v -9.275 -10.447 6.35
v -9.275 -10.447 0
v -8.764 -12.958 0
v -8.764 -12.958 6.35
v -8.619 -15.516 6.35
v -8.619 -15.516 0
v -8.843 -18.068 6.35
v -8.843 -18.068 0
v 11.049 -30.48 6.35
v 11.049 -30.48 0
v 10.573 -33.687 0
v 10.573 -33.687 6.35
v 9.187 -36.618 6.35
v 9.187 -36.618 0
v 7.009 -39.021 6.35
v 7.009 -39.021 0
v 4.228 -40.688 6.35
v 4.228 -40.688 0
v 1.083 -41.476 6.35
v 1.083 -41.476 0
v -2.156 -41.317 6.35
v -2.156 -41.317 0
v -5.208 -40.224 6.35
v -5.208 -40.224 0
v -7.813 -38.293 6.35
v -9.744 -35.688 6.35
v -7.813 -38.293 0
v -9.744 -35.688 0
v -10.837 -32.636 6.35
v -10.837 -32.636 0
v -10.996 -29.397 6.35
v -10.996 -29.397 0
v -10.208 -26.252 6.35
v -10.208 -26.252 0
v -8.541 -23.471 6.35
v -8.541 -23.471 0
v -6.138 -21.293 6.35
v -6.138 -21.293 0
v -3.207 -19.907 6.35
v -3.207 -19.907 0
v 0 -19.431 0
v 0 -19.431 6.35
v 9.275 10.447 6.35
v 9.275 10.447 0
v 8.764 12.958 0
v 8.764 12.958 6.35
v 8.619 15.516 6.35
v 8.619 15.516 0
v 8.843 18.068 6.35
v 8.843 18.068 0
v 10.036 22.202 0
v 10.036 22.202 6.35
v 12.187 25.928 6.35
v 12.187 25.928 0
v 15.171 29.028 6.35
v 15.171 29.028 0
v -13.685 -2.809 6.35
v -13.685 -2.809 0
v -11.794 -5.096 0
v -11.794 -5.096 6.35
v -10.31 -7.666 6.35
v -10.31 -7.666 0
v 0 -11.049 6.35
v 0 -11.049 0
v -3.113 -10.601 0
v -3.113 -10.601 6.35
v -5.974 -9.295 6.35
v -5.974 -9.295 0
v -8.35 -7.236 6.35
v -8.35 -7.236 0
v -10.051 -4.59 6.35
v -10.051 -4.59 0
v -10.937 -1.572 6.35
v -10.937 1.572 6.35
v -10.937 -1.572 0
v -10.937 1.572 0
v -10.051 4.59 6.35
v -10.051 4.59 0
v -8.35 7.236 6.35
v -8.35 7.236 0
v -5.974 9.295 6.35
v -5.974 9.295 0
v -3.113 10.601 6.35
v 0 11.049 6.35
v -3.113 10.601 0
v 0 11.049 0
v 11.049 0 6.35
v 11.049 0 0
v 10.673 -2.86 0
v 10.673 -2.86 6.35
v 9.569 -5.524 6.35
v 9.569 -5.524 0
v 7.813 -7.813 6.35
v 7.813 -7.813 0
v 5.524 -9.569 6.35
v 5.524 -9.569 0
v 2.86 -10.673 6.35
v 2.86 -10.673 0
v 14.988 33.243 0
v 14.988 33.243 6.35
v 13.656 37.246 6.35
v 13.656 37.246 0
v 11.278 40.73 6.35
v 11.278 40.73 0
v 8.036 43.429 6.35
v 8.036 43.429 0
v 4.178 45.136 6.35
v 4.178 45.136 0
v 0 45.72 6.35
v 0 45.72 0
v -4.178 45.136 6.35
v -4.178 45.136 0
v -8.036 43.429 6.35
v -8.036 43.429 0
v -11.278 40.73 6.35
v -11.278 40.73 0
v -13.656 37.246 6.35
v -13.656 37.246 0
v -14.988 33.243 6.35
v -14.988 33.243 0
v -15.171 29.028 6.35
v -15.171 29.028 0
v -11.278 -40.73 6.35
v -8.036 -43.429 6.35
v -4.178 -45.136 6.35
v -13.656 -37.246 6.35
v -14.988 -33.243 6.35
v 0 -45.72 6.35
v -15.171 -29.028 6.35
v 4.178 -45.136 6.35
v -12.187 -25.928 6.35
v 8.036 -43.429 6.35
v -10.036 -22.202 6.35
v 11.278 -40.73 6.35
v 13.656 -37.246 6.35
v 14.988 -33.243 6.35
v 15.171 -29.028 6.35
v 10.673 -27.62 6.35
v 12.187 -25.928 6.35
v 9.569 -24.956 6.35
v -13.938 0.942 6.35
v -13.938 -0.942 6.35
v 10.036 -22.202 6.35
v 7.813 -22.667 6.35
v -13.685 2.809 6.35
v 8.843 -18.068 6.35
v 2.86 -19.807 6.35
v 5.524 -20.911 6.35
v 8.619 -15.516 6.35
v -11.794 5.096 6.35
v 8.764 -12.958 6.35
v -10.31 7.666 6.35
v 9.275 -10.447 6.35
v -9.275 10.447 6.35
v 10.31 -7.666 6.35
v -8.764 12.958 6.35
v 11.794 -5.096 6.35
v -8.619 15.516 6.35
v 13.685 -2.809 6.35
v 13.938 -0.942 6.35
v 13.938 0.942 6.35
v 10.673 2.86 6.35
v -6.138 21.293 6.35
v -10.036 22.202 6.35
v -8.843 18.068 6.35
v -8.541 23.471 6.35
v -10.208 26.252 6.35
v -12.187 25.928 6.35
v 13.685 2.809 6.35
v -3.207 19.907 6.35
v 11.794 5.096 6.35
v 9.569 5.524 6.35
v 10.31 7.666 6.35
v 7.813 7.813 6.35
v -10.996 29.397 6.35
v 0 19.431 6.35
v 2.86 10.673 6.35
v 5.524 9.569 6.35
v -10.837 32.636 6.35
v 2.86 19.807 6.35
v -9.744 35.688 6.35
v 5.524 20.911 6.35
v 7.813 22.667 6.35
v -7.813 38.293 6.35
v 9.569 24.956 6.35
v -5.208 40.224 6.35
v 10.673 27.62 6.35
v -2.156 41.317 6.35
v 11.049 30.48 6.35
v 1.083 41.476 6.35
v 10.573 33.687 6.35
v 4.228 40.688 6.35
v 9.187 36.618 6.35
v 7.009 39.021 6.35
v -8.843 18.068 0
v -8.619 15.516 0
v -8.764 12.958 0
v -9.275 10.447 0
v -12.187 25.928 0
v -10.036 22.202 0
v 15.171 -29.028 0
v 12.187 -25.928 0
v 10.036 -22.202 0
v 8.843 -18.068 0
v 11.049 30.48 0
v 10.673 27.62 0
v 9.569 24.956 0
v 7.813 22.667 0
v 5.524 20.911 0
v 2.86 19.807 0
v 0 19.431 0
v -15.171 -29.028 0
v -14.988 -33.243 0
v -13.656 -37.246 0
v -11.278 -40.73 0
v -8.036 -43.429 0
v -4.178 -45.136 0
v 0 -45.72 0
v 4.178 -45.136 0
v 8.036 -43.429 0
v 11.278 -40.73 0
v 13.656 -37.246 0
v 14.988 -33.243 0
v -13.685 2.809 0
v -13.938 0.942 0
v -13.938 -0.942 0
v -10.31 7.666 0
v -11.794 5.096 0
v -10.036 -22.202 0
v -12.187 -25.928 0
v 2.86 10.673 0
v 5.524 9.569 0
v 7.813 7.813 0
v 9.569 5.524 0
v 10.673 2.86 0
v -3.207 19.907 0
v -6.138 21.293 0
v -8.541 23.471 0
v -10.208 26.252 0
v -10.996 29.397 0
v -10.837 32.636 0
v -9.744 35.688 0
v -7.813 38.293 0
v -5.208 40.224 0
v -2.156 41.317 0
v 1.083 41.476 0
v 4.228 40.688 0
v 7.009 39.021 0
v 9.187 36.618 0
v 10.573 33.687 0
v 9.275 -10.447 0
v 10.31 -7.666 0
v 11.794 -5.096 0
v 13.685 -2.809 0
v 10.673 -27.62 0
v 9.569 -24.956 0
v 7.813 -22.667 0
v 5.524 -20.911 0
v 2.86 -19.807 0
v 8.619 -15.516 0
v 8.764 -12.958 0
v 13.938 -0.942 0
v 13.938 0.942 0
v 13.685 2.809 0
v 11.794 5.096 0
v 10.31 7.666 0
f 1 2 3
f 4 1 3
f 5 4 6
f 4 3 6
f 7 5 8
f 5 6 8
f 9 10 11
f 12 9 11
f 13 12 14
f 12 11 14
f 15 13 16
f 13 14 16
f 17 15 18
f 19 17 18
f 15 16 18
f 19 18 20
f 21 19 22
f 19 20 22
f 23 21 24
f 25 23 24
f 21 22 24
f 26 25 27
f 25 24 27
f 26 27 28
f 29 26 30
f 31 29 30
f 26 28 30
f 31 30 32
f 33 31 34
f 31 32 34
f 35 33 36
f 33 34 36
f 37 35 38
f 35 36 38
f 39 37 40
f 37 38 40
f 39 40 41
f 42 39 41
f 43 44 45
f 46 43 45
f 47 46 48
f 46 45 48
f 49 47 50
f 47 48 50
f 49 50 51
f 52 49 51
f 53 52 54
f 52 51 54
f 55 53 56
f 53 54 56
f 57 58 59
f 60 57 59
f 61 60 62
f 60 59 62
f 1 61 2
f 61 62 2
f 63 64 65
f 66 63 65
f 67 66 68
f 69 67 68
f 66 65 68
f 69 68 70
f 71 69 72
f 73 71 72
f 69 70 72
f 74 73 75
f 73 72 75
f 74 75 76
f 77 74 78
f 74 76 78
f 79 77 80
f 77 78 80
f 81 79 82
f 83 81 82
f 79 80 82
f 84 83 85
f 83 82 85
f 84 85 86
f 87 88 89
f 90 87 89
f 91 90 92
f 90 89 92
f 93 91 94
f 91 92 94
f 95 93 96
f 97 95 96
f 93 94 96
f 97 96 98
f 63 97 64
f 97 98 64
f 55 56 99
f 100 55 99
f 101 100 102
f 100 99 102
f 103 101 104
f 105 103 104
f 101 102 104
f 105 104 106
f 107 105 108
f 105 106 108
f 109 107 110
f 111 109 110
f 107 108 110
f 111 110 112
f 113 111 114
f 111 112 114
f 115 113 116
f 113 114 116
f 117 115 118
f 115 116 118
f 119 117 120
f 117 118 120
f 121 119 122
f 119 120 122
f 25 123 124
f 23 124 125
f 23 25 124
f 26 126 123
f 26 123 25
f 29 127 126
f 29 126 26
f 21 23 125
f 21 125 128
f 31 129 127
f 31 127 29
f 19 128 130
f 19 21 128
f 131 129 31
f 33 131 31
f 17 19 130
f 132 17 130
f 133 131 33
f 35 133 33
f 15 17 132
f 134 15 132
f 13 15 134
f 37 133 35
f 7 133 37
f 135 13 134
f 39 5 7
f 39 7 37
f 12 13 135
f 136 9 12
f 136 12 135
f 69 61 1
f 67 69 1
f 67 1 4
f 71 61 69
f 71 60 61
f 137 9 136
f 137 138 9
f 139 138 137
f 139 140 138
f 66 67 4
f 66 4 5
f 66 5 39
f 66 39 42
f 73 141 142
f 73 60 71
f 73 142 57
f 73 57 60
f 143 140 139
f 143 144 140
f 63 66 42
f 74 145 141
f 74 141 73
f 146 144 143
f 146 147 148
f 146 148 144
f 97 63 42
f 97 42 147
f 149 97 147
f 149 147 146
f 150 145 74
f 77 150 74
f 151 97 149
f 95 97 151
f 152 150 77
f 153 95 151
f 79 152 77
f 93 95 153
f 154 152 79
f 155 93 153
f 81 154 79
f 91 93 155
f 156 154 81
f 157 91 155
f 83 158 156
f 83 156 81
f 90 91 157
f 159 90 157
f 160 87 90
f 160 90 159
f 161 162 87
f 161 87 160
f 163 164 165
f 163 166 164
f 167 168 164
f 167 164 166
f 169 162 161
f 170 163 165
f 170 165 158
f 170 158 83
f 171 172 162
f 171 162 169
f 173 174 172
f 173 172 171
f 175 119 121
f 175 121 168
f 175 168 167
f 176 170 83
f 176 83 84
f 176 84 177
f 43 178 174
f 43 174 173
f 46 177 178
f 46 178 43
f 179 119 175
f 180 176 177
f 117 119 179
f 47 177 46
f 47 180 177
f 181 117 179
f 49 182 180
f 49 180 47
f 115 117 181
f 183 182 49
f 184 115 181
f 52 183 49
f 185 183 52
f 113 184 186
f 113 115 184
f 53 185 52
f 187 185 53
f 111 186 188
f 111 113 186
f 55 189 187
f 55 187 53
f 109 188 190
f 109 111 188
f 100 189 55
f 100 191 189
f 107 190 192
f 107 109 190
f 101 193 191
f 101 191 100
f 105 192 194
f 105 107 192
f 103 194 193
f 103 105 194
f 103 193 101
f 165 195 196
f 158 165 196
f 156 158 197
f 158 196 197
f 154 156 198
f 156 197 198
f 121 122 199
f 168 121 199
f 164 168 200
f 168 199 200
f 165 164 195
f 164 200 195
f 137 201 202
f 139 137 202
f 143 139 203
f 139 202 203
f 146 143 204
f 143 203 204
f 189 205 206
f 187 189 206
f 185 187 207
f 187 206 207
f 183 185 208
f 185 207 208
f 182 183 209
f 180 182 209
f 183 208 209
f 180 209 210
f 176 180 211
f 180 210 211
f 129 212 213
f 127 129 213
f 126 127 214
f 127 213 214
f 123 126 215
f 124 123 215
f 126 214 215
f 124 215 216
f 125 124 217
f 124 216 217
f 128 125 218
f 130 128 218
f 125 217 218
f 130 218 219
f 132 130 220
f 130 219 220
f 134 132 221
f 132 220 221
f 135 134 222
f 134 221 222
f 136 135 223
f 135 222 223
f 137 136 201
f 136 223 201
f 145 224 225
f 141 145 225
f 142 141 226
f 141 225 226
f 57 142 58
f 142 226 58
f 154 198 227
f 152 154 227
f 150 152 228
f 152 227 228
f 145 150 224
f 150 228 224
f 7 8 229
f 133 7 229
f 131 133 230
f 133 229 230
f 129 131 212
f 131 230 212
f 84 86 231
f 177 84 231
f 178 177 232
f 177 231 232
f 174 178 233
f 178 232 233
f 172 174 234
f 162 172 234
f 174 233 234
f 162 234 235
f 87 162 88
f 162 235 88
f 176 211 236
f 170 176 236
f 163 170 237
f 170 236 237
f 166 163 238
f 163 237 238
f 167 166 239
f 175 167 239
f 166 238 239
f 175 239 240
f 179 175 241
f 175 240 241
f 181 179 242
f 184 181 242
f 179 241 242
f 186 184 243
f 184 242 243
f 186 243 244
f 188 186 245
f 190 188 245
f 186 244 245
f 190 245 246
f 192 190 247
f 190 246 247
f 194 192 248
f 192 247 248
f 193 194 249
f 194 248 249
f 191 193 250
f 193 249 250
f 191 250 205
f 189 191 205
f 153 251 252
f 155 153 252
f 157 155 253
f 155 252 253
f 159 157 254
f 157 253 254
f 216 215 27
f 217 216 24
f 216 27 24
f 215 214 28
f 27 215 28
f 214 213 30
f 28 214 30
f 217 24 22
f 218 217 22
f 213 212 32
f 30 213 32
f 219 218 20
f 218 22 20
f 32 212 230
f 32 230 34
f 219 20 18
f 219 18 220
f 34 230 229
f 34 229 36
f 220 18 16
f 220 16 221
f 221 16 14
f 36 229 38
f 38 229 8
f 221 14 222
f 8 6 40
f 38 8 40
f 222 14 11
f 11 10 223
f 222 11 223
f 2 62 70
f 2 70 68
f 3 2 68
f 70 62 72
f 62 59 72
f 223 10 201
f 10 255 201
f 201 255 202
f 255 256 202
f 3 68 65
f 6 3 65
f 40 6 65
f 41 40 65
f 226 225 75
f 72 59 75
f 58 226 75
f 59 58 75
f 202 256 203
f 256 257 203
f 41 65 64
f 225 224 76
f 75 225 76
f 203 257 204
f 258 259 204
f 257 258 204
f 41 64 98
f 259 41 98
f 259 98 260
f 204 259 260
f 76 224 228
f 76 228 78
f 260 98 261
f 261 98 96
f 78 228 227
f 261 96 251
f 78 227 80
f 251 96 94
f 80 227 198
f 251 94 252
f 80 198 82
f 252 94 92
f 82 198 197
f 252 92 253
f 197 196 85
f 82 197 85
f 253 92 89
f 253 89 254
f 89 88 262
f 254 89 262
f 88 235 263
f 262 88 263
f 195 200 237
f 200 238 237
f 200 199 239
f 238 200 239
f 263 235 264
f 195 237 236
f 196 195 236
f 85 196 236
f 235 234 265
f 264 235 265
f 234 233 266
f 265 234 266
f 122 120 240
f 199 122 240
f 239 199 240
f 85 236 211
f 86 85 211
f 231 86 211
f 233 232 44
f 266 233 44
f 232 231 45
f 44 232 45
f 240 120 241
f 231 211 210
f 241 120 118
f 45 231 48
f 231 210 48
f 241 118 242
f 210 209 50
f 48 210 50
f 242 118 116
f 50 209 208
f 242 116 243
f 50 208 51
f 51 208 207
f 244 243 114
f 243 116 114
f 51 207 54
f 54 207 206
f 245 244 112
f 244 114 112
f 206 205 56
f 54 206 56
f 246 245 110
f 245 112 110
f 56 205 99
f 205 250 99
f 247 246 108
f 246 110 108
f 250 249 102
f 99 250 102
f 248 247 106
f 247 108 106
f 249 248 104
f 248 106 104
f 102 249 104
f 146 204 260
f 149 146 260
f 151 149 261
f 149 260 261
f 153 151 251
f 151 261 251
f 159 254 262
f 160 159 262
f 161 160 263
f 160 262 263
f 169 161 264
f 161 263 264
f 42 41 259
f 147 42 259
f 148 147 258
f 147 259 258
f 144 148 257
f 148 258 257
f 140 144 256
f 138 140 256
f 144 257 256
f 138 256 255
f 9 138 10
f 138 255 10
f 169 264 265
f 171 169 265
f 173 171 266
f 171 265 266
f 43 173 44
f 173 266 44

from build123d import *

# Parameters (mm, degrees)
F1_DEPTH = 6.35


with BuildPart() as f1:
    # F0 (on Top) → F1 (new body)
    with BuildSketch(Plane.XY):
        with BuildLine():
            ThreePointArc((-8.8427640474, 18.067783276), (-4.6419509437, 15.9641503371), (0, 15.24))
            ThreePointArc((0, 15.24), (4.6419509437, 15.9641503371), (8.8427640474, 18.067783276))
            ThreePointArc((8.8427640474, 18.067783276), (10.9985226281, 24.13), (15.1706770239, 29.0280500573))
            ThreePointArc((15.1706770239, 29.0280500573), (0, 45.72), (-15.1706770239, 29.0280500573))
            ThreePointArc((-15.1706770239, 29.0280500573), (-10.9985226281, 24.13), (-8.8427640474, 18.067783276))
        make_face()
        with BuildLine():
            ThreePointArc((11.049, 30.48), (7.8128228253, 22.6671771747), (0, 19.431))
            ThreePointArc((0, 19.431), (-7.8128228253, 38.2928228253), (11.049, 30.48))
        make_face(mode=Mode.SUBTRACT)
        with BuildLine():
            Line((0, 15.24), (0, 13.97))
            ThreePointArc((0, 13.97), (4.9605882744, 13.059611938), (9.2746396347, 10.4471029308))
            ThreePointArc((9.2746396347, 10.4471029308), (8.6449373915, 14.2339944405), (8.8427640474, 18.067783276))
            ThreePointArc((8.8427640474, 18.067783276), (4.6419509437, 15.9641503371), (0, 15.24))
        make_face()
        with BuildLine():
            ThreePointArc((-9.2746396347, 10.4471029308), (-4.9605882744, 13.059611938), (0, 13.97))
            Line((0, 13.97), (0, 15.24))
            ThreePointArc((0, 15.24), (-4.6419509437, 15.9641503371), (-8.8427640474, 18.067783276))
            ThreePointArc((-8.8427640474, 18.067783276), (-8.6449373915, 14.2339944405), (-9.2746396347, 10.4471029308))
        make_face()
        with BuildLine():
            ThreePointArc((0, -11.049), (-11.049, 0), (0, 11.049))
            Line((0, 11.049), (0, 13.97))
            ThreePointArc((0, 13.97), (-4.9605882744, 13.059611938), (-9.2746396347, 10.4471029308))
            ThreePointArc((-9.2746396347, 10.4471029308), (-10.9985226281, 6.35), (-13.6847763514, 2.8085220692))
            ThreePointArc((-13.6847763514, 2.8085220692), (-13.97, 0), (-13.6847763514, -2.8085220692))
            ThreePointArc((-13.6847763514, -2.8085220692), (-10.9985226281, -6.35), (-9.2746396347, -10.4471029308))
            ThreePointArc((-9.2746396347, -10.4471029308), (-4.9605882744, -13.059611938), (0, -13.97))
            Line((0, -13.97), (0, -11.049))
        make_face()
        with BuildLine():
            ThreePointArc((0, 11.049), (7.8128228253, 7.8128228253), (11.049, 0))
            ThreePointArc((11.049, 0), (7.8128228253, -7.8128228253), (0, -11.049))
            Line((0, -11.049), (0, -13.97))
            ThreePointArc((0, -13.97), (4.9605882744, -13.059611938), (9.2746396347, -10.4471029308))
            ThreePointArc((9.2746396347, -10.4471029308), (10.9985226281, -6.35), (13.6847763514, -2.8085220692))
            ThreePointArc((13.6847763514, -2.8085220692), (13.97, 0), (13.6847763514, 2.8085220692))
            ThreePointArc((13.6847763514, 2.8085220692), (10.9985226281, 6.35), (9.2746396347, 10.4471029308))
            ThreePointArc((9.2746396347, 10.4471029308), (4.9605882744, 13.059611938), (0, 13.97))
            Line((0, 13.97), (0, 11.049))
        make_face()
        with BuildLine():
            ThreePointArc((9.2746396347, -10.4471029308), (4.9605882744, -13.059611938), (0, -13.97))
            Line((0, -13.97), (0, -15.24))
            ThreePointArc((0, -15.24), (4.6419509437, -15.9641503371), (8.8427640474, -18.067783276))
            ThreePointArc((8.8427640474, -18.067783276), (8.6449373915, -14.2339944405), (9.2746396347, -10.4471029308))
        make_face()
        with BuildLine():
            Line((0, -15.24), (0, -13.97))
            ThreePointArc((0, -13.97), (-4.9605882744, -13.059611938), (-9.2746396347, -10.4471029308))
            ThreePointArc((-9.2746396347, -10.4471029308), (-8.6449373915, -14.2339944405), (-8.8427640474, -18.067783276))
            ThreePointArc((-8.8427640474, -18.067783276), (-4.6419509437, -15.9641503371), (0, -15.24))
        make_face()
        with BuildLine():
            ThreePointArc((8.8427640474, -18.067783276), (4.6419509437, -15.9641503371), (0, -15.24))
            ThreePointArc((0, -15.24), (-4.6419509437, -15.9641503371), (-8.8427640474, -18.067783276))
            ThreePointArc((-8.8427640474, -18.067783276), (-10.9985226281, -24.13), (-15.1706770239, -29.0280500573))
            ThreePointArc((-15.1706770239, -29.0280500573), (0, -45.72), (15.1706770239, -29.0280500573))
            ThreePointArc((15.1706770239, -29.0280500573), (10.9985226281, -24.13), (8.8427640474, -18.067783276))
        make_face()
        with BuildLine():
            ThreePointArc((11.049, -30.48), (-7.8128228253, -38.2928228253), (0, -19.431))
            ThreePointArc((0, -19.431), (7.8128228253, -22.6671771747), (11.049, -30.48))
        make_face(mode=Mode.SUBTRACT)
    extrude(amount=F1_DEPTH)


solid = f1.part
